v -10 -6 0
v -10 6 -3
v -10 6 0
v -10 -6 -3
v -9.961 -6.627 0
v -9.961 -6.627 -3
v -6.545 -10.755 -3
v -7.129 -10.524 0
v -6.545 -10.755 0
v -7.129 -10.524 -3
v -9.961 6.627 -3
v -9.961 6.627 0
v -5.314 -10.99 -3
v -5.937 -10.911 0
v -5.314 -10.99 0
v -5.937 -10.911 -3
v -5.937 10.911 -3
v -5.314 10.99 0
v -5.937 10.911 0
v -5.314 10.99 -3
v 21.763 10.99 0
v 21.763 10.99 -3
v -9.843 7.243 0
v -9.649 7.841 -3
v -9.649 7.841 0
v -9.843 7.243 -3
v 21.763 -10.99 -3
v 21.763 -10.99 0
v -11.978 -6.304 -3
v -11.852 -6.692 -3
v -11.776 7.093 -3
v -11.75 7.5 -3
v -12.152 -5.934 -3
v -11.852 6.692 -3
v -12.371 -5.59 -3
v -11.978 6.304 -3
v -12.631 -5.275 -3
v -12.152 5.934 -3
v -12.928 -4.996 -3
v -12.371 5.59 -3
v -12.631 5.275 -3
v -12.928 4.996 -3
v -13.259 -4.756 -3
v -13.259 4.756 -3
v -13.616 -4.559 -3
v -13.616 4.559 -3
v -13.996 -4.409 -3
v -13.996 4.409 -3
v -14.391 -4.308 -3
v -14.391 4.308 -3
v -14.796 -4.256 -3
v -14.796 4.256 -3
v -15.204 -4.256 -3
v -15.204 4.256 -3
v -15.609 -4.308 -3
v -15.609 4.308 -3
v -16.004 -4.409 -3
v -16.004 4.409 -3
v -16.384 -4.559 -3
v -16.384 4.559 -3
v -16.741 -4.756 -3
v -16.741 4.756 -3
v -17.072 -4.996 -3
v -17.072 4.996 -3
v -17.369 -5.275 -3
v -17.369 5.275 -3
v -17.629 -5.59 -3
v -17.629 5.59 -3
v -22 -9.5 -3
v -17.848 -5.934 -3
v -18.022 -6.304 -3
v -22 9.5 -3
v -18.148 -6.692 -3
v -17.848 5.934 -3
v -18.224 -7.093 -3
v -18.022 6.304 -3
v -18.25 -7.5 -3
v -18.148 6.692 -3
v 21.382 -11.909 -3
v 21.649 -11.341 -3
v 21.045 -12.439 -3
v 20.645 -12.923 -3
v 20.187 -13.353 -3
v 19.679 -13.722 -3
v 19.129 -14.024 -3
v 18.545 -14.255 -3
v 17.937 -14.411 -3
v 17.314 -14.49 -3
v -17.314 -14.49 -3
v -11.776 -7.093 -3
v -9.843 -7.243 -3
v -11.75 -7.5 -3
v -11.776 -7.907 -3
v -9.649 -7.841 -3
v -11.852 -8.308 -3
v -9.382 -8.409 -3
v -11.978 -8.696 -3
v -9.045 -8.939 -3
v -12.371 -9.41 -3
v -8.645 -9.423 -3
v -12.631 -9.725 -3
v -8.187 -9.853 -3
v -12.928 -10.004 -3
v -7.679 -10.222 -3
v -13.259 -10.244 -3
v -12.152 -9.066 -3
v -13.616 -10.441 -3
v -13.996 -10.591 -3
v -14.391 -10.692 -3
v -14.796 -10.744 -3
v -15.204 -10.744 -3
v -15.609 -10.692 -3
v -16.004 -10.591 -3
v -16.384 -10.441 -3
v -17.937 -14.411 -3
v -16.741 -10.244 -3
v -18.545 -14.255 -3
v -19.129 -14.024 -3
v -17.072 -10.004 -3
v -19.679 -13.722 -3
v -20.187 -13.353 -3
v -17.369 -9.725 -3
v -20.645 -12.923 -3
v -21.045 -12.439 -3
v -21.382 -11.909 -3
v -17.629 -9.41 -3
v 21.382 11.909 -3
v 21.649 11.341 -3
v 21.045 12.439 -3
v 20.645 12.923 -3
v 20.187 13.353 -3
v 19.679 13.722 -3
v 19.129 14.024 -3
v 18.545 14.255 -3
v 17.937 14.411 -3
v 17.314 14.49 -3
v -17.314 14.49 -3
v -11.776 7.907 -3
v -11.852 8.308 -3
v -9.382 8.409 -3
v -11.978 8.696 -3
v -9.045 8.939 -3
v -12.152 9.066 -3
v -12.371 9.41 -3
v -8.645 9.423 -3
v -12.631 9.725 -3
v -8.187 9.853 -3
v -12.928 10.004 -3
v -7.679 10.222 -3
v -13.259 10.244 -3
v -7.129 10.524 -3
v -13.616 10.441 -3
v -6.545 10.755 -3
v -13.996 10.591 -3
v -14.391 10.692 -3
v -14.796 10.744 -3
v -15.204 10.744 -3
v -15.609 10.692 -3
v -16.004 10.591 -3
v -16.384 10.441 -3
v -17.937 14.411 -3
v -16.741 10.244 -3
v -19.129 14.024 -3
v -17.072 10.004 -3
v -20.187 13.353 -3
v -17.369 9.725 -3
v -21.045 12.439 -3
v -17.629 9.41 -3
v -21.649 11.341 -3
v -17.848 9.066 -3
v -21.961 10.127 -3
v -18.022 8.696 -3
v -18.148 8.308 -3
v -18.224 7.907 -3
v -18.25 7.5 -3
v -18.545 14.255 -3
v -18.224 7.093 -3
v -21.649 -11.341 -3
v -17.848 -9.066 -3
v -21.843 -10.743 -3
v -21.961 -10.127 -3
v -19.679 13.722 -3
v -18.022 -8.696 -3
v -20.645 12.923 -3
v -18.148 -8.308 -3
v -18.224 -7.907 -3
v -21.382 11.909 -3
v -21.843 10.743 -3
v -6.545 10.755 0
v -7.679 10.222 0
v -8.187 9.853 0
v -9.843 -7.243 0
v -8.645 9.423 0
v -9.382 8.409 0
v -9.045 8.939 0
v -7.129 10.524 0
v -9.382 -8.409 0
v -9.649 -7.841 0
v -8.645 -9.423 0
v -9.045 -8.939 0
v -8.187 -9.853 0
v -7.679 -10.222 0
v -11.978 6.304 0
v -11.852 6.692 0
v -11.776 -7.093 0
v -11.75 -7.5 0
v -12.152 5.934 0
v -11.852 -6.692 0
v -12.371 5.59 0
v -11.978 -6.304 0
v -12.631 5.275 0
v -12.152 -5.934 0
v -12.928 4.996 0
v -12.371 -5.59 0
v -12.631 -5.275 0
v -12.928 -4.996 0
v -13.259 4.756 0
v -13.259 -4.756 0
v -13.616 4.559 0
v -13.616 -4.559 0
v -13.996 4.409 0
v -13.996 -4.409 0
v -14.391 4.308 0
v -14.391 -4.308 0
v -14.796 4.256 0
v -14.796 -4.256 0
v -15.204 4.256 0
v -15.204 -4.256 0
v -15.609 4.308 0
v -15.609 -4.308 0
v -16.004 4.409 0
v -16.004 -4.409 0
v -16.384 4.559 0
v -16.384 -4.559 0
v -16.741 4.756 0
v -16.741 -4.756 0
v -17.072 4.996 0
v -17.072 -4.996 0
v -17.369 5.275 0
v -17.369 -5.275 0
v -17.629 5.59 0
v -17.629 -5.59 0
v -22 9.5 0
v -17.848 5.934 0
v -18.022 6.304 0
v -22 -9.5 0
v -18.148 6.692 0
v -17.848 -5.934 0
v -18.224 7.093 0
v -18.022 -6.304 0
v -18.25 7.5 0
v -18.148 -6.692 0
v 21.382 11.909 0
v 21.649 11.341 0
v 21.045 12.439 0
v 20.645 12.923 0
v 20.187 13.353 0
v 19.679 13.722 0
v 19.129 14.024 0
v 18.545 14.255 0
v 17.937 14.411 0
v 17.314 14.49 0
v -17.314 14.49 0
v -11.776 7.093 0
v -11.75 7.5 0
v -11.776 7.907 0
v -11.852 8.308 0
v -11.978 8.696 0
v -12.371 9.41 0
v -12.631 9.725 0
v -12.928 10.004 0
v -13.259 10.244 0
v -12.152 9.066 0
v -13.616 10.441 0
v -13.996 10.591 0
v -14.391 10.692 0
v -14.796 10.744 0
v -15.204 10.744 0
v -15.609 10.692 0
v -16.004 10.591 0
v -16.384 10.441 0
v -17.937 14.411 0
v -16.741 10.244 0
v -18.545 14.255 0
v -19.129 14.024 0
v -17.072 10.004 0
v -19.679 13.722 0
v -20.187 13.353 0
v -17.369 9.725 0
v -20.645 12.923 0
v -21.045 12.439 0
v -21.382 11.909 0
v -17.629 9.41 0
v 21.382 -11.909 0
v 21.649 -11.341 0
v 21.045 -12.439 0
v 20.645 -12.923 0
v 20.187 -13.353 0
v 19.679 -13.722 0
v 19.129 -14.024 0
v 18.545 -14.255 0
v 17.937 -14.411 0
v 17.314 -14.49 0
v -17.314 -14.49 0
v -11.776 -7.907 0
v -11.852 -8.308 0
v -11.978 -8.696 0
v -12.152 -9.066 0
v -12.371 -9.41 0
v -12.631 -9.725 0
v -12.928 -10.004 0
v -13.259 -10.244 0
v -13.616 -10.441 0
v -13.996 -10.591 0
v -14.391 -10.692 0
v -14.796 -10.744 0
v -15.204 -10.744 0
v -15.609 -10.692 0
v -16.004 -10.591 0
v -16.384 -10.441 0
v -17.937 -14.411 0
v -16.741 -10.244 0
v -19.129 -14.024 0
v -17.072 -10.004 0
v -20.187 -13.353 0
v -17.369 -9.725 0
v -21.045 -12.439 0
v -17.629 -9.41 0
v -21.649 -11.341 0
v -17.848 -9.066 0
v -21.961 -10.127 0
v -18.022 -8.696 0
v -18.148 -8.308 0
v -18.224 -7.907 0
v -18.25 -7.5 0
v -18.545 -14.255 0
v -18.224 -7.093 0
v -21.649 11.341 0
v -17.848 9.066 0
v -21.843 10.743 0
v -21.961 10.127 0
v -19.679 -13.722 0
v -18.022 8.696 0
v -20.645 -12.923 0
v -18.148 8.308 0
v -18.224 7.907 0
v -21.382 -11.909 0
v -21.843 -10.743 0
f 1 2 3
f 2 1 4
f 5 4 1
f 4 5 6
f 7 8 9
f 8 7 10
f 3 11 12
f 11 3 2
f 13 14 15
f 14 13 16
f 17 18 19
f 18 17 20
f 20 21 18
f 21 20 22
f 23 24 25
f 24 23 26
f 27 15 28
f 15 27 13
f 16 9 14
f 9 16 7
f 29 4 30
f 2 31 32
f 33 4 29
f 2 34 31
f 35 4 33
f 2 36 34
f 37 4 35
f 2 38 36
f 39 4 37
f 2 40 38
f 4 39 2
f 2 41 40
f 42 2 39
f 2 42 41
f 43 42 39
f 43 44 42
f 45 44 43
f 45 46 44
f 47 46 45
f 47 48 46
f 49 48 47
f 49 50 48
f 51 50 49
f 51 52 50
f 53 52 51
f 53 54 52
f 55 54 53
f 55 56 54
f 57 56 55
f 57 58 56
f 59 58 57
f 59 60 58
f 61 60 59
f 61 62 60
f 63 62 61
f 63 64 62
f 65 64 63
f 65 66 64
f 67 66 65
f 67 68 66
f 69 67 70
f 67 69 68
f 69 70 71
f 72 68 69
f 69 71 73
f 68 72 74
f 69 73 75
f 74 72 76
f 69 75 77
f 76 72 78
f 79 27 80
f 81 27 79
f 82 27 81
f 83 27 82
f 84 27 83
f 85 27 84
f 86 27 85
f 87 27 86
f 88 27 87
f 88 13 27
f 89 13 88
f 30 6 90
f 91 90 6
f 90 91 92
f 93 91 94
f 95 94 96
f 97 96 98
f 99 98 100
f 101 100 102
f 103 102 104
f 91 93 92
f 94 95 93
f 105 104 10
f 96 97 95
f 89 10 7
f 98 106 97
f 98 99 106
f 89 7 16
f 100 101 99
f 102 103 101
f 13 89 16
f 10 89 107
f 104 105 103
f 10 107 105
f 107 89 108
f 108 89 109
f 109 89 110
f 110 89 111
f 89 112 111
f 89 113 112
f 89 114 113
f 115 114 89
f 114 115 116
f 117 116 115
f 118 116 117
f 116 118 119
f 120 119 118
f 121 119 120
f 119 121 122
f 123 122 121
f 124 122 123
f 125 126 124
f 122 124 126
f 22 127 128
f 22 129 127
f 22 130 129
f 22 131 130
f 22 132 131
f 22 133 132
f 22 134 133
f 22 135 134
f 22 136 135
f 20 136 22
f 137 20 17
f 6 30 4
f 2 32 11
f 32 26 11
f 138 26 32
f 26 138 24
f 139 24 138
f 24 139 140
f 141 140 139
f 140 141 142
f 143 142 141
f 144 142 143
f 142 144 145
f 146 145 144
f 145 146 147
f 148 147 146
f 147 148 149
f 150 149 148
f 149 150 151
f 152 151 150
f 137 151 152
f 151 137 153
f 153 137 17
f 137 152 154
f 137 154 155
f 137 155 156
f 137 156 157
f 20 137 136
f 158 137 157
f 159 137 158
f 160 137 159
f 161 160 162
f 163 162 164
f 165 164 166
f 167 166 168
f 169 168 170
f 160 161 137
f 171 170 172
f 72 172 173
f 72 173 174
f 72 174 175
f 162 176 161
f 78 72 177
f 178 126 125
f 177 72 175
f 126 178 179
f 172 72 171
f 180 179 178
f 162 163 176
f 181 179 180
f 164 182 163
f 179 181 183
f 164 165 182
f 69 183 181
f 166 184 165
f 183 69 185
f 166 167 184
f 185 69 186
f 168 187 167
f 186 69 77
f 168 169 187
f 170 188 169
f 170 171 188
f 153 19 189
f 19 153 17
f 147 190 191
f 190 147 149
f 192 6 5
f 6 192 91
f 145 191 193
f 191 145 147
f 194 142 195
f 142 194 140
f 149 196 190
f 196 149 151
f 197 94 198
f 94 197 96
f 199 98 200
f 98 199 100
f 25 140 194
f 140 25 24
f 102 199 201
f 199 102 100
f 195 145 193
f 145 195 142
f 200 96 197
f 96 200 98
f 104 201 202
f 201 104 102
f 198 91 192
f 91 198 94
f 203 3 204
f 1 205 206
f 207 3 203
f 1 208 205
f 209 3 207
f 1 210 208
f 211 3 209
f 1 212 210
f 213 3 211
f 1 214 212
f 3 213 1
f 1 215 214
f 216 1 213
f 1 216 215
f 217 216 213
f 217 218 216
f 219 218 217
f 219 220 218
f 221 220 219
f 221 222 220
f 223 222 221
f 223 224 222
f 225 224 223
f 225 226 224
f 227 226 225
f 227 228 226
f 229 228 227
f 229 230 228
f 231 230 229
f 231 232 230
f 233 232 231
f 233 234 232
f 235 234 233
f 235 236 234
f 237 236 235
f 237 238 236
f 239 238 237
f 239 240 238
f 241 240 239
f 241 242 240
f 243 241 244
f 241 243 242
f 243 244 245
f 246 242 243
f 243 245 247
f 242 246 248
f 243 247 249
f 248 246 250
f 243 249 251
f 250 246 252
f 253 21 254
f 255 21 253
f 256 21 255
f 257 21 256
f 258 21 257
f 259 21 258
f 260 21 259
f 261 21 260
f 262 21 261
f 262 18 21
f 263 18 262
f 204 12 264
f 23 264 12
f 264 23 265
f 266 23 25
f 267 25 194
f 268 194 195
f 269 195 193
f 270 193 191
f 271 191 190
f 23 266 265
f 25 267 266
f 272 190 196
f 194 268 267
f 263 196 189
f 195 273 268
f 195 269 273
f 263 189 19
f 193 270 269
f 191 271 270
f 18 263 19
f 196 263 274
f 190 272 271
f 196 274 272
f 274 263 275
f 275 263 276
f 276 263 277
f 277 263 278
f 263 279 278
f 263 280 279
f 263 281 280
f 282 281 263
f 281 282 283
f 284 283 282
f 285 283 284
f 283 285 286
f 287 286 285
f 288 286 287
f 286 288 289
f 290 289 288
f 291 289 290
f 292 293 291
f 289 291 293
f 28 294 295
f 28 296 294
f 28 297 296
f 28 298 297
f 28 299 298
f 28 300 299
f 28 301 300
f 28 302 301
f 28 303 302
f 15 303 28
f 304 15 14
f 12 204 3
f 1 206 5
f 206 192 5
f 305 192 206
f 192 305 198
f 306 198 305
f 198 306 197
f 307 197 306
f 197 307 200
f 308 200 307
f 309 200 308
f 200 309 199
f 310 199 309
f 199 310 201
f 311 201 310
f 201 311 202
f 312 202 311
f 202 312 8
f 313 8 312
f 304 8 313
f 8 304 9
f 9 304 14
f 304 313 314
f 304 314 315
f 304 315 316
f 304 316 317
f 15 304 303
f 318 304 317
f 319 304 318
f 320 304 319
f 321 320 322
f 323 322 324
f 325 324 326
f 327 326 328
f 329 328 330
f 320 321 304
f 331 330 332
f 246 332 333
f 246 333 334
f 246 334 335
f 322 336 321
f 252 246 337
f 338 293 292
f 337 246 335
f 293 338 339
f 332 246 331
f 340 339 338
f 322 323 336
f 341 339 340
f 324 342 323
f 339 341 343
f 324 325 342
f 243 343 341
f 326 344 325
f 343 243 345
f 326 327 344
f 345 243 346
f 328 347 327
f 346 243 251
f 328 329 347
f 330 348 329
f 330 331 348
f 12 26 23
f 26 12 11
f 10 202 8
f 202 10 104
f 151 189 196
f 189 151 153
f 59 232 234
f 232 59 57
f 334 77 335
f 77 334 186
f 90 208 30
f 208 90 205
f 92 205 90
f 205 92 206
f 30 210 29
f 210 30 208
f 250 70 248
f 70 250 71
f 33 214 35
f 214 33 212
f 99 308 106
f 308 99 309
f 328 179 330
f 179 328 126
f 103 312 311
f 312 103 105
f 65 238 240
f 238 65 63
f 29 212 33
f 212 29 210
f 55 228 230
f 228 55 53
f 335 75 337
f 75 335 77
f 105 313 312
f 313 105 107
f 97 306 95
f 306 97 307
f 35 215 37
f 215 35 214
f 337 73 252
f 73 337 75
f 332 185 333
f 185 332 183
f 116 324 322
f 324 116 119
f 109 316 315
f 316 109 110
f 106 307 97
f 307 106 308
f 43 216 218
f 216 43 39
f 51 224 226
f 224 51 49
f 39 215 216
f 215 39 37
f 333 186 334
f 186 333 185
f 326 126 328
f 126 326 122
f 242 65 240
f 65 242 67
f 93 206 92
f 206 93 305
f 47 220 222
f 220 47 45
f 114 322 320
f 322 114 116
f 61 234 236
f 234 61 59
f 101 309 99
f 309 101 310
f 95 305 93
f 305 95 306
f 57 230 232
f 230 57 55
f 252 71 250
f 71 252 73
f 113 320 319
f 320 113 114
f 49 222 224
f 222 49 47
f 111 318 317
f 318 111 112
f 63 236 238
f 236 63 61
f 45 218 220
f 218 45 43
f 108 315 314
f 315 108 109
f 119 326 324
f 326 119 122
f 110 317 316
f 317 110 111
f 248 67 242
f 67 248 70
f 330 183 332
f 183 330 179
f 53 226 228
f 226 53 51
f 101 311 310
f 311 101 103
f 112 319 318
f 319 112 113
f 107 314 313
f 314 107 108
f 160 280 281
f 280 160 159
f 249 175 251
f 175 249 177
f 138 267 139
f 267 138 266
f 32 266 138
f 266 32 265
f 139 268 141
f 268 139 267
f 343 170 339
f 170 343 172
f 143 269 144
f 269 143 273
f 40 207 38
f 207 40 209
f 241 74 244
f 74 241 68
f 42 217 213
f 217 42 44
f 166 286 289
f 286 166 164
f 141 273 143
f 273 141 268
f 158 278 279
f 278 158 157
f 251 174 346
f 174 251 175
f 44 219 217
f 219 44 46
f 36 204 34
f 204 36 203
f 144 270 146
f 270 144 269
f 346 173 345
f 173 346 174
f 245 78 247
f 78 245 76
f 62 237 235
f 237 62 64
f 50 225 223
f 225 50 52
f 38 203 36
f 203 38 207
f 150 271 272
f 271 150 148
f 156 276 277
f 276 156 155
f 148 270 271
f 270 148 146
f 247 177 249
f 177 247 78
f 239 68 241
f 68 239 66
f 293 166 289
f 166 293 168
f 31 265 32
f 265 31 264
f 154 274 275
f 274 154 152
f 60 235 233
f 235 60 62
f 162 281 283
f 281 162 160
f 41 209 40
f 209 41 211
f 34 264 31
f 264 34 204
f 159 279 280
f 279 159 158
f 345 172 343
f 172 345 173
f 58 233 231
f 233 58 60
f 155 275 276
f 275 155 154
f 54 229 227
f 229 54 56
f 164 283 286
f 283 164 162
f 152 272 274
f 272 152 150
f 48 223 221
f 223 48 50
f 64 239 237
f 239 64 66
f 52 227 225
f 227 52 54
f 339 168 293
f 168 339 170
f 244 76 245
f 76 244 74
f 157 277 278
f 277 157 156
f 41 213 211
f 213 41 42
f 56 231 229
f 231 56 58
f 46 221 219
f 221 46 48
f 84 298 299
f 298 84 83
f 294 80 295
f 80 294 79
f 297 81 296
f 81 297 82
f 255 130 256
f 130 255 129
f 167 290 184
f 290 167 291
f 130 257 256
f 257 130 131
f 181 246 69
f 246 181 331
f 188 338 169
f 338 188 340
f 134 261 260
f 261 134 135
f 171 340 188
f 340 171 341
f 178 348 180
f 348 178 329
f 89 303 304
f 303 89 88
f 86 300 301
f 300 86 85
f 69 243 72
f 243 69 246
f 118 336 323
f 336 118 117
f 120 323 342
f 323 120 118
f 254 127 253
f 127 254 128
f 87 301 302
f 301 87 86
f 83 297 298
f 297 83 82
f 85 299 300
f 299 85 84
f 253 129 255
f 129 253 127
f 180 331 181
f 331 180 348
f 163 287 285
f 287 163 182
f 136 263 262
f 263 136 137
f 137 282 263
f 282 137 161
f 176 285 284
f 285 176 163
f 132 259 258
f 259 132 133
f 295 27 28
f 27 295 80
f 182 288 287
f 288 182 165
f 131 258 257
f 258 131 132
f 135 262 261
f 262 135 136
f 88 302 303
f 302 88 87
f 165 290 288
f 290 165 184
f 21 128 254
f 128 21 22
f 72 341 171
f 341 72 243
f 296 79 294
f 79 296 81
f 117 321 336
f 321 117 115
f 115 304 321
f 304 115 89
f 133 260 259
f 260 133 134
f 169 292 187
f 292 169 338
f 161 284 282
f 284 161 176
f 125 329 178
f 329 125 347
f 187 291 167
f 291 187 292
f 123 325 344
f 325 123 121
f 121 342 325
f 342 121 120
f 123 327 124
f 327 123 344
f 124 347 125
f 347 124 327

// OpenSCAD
$fn = 50;


difference() {
	union() {
		*color(alpha = 1.0000000000, c = "gray") {
			translate(v = [0, 14, -3]) {
				linear_extrude(height = 2) {
					text(font = "Arial:style=Bold", halign = "center", size = 4.5000000000, text = "COMMENT description oobb_plate_shape_positive_type_3_depth_0_0_-3_pos_spacer_u_extra_3_thickness_3_width_2_height_0_0_-3_pos_plate", valign = "center");
				}
			}
		}
		translate(v = [0, 0, -3]) {
			hull() {
				translate(v = [-17.0000000000, 9.5000000000, 0]) {
					cylinder(h = 3, r = 5);
				}
				translate(v = [17.0000000000, 9.5000000000, 0]) {
					cylinder(h = 3, r = 5);
				}
				translate(v = [-17.0000000000, -9.5000000000, 0]) {
					cylinder(h = 3, r = 5);
				}
				translate(v = [17.0000000000, -9.5000000000, 0]) {
					cylinder(h = 3, r = 5);
				}
			}
		}
		*color(alpha = 1.0000000000, c = "gray") {
			translate(v = [0, 14, -3]) {
				linear_extrude(height = 2) {
					text(font = "Arial:style=Bold", halign = "center", size = 4.5000000000, text = "COMMENT description oobb_holes_shape_p_type_0_0_-3_pos_spacer_u_extra_3_thickness_3_width_2_height_0_0_-3_pos_plate_'left'_'right'_'top'_hole_sides_'left'_'right'_'top'_holes_true_both_holes", valign = "center");
				}
			}
		}
		*color(alpha = 1.0000000000, c = "gray") {
			translate(v = [0, 14, -3]) {
				rotate(a = [0, 0, 180]) {
					linear_extrude(height = 2) {
						text(font = "Arial:style=Bold", halign = "center", size = 4.5000000000, text = "COMMENT description oobb_wire_spacer_u_shape_0_0_-3_pos_spacer_u_extra_3_thickness_3_width_2_height_0_0_-3_pos_plate_0_0_180_rot", valign = "center");
					}
				}
			}
		}
	}
	union() {
		translate(v = [0, 0, -3]) {
			rotate(a = [0, 0, 180]) {
				difference() {
					union() {
						translate(v = [-10, 0, 0]) {
							hull() {
								translate(v = [-15.0000000000, 6.0000000000, 0]) {
									cylinder(h = 3, r = 5);
								}
								translate(v = [15.0000000000, 6.0000000000, 0]) {
									cylinder(h = 3, r = 5);
								}
								translate(v = [-15.0000000000, -6.0000000000, 0]) {
									cylinder(h = 3, r = 5);
								}
								translate(v = [15.0000000000, -6.0000000000, 0]) {
									cylinder(h = 3, r = 5);
								}
							}
						}
					}
					union();
				}
			}
		}
		translate(v = [-15.0000000000, -7.5000000000, -50.0000000000]) {
			cylinder(h = 100, r = 3.2500000000);
		}
		translate(v = [-15.0000000000, 7.5000000000, -50.0000000000]) {
			cylinder(h = 100, r = 3.2500000000);
		}
		translate(v = [-15.0000000000, 7.5000000000, -50.0000000000]) {
			cylinder(h = 100, r = 3.2500000000);
		}
		translate(v = [0.0000000000, 7.5000000000, -50.0000000000]) {
			cylinder(h = 100, r = 3.2500000000);
		}
		translate(v = [15.0000000000, 7.5000000000, -50.0000000000]) {
			cylinder(h = 100, r = 3.2500000000);
		}
		translate(v = [-15.0000000000, -7.5000000000, -50.0000000000]) {
			cylinder(h = 100, r = 3.2500000000);
		}
		translate(v = [0.0000000000, -7.5000000000, -50.0000000000]) {
			cylinder(h = 100, r = 3.2500000000);
		}
		translate(v = [15.0000000000, -7.5000000000, -50.0000000000]) {
			cylinder(h = 100, r = 3.2500000000);
		}
	}
}
